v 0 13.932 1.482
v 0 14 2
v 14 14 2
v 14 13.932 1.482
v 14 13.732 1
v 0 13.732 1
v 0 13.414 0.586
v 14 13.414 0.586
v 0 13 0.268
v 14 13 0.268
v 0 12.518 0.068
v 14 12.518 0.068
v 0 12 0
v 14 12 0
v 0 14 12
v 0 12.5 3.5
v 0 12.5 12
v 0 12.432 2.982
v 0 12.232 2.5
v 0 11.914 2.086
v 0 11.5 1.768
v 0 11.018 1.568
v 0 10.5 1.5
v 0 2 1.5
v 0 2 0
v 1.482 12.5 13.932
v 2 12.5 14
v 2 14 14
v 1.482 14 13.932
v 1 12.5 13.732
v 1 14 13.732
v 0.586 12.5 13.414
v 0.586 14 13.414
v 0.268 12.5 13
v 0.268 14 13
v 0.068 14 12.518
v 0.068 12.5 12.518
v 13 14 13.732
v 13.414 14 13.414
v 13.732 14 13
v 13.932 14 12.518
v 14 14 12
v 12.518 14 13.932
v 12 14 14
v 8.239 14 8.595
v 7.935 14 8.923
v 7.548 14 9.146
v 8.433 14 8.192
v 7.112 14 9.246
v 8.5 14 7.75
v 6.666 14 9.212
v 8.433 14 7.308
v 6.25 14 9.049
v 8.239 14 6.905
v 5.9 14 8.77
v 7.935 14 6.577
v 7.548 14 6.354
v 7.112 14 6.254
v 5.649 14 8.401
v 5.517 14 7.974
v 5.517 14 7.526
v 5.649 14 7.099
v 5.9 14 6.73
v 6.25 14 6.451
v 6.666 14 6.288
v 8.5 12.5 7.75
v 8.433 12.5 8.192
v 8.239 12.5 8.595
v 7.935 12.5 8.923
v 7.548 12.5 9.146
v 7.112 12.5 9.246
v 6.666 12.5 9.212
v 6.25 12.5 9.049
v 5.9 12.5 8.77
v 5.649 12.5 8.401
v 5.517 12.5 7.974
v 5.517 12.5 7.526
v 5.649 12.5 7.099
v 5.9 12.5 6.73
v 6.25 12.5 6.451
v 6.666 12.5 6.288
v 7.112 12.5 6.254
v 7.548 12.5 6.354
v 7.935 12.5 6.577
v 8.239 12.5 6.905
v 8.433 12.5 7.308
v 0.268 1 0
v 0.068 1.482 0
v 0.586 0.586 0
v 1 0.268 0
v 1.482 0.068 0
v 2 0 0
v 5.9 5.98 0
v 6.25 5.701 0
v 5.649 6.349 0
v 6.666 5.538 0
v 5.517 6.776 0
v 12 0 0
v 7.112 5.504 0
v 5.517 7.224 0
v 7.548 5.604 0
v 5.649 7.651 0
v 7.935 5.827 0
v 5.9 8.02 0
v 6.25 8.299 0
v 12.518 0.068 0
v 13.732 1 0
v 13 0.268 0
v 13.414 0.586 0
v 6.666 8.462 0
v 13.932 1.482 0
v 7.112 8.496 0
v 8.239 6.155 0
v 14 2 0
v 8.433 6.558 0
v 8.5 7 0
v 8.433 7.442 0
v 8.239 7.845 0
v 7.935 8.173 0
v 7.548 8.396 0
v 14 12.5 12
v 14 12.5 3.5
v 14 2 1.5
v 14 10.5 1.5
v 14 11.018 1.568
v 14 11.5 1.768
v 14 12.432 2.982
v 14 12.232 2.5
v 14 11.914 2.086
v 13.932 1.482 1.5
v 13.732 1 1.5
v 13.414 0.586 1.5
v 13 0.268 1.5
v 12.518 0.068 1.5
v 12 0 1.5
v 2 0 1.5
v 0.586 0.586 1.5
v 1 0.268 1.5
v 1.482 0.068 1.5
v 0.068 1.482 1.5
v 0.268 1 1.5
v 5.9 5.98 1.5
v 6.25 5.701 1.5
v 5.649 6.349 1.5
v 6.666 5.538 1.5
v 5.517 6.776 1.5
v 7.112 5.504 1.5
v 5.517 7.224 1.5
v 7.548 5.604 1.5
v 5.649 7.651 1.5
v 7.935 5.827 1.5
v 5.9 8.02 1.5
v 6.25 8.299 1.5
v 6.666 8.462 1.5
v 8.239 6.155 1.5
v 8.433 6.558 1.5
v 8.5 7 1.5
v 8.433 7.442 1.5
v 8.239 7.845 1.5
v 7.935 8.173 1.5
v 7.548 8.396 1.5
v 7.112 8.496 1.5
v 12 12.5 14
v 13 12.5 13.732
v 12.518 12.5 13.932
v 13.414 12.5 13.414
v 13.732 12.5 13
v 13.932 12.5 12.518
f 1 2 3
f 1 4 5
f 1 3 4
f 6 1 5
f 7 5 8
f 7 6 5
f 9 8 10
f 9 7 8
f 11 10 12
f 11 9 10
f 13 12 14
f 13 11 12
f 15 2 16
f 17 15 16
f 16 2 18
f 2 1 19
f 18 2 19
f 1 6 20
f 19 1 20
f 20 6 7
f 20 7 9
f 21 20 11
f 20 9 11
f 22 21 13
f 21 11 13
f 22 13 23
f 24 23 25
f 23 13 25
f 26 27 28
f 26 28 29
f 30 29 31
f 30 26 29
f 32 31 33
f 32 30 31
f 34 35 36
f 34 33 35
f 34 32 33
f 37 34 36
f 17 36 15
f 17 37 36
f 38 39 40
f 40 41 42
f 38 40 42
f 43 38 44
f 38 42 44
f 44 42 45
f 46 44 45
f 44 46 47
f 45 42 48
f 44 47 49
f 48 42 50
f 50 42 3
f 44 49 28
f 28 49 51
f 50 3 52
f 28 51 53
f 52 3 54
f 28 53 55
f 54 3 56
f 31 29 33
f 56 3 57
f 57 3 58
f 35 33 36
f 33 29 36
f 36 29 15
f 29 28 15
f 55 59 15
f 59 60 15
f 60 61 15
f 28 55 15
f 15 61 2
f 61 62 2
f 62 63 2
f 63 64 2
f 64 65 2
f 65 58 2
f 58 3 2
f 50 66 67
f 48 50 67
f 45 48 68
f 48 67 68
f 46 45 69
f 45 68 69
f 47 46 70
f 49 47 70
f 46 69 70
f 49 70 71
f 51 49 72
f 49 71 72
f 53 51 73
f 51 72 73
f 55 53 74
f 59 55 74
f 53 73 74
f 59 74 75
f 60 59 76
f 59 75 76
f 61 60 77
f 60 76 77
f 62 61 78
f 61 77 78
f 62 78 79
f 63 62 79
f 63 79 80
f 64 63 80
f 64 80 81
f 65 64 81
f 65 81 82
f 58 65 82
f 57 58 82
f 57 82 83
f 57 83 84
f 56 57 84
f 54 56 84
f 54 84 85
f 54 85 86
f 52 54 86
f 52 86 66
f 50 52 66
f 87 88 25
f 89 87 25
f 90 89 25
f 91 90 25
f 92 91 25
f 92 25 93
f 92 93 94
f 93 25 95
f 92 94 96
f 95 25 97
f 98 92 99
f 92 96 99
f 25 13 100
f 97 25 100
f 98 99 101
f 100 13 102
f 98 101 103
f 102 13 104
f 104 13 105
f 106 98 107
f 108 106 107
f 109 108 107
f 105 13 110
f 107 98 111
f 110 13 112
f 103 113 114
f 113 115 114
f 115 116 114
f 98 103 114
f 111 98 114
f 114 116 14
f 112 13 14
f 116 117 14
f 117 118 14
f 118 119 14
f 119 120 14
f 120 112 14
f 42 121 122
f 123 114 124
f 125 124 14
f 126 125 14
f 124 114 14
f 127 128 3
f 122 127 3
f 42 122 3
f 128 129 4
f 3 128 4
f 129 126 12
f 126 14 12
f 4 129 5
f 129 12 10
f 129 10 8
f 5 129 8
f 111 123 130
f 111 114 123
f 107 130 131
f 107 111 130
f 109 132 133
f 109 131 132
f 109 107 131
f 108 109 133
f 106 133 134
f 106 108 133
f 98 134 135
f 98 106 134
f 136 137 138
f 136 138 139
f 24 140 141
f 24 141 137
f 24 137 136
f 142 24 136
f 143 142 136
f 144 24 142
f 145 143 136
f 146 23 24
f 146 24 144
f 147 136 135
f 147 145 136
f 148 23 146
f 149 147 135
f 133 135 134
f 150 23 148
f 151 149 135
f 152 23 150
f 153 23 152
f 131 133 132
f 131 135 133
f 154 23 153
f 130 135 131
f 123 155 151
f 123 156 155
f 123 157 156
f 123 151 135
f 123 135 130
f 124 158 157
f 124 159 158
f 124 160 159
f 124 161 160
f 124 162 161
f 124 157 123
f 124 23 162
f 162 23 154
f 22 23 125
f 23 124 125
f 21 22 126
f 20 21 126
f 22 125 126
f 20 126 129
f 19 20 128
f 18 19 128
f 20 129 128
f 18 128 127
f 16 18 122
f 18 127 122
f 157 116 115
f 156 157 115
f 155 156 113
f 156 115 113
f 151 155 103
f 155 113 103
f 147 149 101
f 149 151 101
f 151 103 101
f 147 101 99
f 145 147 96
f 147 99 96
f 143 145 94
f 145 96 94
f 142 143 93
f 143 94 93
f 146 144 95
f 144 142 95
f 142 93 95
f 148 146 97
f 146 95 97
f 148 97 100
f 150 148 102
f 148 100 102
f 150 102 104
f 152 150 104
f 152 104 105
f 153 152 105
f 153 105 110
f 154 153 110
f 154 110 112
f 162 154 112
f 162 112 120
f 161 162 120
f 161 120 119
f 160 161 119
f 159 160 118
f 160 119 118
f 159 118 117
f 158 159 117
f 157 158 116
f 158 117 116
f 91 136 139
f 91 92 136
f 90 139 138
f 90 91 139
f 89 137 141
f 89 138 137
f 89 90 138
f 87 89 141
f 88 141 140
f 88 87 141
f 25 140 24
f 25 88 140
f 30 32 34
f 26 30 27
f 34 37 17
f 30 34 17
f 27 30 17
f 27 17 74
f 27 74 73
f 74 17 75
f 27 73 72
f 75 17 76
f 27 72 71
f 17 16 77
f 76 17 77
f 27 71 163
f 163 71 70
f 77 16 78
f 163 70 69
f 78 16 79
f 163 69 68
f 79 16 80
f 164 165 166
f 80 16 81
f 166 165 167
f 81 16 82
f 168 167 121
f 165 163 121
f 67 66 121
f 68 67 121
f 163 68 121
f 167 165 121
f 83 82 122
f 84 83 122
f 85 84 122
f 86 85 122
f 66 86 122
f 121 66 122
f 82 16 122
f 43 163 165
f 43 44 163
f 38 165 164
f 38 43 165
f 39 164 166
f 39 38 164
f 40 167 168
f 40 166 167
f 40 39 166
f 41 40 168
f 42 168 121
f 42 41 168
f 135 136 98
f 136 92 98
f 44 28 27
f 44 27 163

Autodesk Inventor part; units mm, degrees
ref_plane "YZ Plane" through (0, 0, 0) normal (1, 0, 0) x (0, 1, 0)
ref_plane "XZ Plane" through (0, 0, 0) normal (0, 1, 0) x (-1, 0, 0)
ref_plane "XY Plane" through (0, 0, 0) normal (0, 0, 1) x (1, 0, 0)
sketch "Эскиз1" plane through (0, 0, 0) normal (0, 0, 1) x (1, 0, 0)
  line L0 (2, 0) -> (12, 0)
  line L1 (14, 2) -> (14, 14)
  line L2 (14, 14) -> (0, 14)
  line L3 (0, 14) -> (0, 2)
  circle A0 centre (7, 7) radius 1.5
  arc A1 (0, 2) -> (2, 0) centre (2, 2) ccw
  arc A2 (12, 0) -> (14, 2) centre (12, 2) ccw
  point P0 (0, 0)
  point P1 (14, 0)
  dimension "d0" = 14
  dimension "d1" = 14
  dimension "d2" = 3
  dimension "d5" = 2
extrude "Выдавливание1" add sketch "Эскиз1" along normal blind 1.5
sketch "Эскиз2" plane through (0, 0, 1.5) normal (0, 0, 1) x (1, 0, 0)
  line L0 (14, 2) -> (14, 14) projected
  line L1 (14, 14) -> (0, 14)
  line L2 (0, 14) -> (0, 12.5)
  line L3 (0, 12.5) -> (14, 12.5)
  line L4 (14, 12.5) -> (14, 14)
  point P0 (0, 0)
  dimension "d6" = 14
  dimension "d7" = 1.5
extrude "Выдавливание2" add sketch "Эскиз2" along normal blind 12.5
fillet "Сопряжение1" radius 2 4 edges at (0, 13.25, 14) (14, 13.25, 14) (7, 12.5, 1.5) (7, 14, 0)
sketch "Эскиз3" plane through (0, 12.5, 3.5) normal (0, -1, 0) x (1, 0, 0)
  line L0 (2, 10.5) -> (12, 10.5) projected
  line L1 (7, 10.5) -> (7, 9.5925)
  line L2 (0, 0) -> (0, 8.5) projected
  line L3 (0, 4.25) -> (2.1841, 4.25)
  circle A0 centre (7, 4.25) radius 1.5
  point P0 (0, -3.5)
  dimension "d11" = 3
extrude "Выдавливание3" cut sketch "Эскиз3" against normal blind 12.5
properties part number "угол 25-26"
